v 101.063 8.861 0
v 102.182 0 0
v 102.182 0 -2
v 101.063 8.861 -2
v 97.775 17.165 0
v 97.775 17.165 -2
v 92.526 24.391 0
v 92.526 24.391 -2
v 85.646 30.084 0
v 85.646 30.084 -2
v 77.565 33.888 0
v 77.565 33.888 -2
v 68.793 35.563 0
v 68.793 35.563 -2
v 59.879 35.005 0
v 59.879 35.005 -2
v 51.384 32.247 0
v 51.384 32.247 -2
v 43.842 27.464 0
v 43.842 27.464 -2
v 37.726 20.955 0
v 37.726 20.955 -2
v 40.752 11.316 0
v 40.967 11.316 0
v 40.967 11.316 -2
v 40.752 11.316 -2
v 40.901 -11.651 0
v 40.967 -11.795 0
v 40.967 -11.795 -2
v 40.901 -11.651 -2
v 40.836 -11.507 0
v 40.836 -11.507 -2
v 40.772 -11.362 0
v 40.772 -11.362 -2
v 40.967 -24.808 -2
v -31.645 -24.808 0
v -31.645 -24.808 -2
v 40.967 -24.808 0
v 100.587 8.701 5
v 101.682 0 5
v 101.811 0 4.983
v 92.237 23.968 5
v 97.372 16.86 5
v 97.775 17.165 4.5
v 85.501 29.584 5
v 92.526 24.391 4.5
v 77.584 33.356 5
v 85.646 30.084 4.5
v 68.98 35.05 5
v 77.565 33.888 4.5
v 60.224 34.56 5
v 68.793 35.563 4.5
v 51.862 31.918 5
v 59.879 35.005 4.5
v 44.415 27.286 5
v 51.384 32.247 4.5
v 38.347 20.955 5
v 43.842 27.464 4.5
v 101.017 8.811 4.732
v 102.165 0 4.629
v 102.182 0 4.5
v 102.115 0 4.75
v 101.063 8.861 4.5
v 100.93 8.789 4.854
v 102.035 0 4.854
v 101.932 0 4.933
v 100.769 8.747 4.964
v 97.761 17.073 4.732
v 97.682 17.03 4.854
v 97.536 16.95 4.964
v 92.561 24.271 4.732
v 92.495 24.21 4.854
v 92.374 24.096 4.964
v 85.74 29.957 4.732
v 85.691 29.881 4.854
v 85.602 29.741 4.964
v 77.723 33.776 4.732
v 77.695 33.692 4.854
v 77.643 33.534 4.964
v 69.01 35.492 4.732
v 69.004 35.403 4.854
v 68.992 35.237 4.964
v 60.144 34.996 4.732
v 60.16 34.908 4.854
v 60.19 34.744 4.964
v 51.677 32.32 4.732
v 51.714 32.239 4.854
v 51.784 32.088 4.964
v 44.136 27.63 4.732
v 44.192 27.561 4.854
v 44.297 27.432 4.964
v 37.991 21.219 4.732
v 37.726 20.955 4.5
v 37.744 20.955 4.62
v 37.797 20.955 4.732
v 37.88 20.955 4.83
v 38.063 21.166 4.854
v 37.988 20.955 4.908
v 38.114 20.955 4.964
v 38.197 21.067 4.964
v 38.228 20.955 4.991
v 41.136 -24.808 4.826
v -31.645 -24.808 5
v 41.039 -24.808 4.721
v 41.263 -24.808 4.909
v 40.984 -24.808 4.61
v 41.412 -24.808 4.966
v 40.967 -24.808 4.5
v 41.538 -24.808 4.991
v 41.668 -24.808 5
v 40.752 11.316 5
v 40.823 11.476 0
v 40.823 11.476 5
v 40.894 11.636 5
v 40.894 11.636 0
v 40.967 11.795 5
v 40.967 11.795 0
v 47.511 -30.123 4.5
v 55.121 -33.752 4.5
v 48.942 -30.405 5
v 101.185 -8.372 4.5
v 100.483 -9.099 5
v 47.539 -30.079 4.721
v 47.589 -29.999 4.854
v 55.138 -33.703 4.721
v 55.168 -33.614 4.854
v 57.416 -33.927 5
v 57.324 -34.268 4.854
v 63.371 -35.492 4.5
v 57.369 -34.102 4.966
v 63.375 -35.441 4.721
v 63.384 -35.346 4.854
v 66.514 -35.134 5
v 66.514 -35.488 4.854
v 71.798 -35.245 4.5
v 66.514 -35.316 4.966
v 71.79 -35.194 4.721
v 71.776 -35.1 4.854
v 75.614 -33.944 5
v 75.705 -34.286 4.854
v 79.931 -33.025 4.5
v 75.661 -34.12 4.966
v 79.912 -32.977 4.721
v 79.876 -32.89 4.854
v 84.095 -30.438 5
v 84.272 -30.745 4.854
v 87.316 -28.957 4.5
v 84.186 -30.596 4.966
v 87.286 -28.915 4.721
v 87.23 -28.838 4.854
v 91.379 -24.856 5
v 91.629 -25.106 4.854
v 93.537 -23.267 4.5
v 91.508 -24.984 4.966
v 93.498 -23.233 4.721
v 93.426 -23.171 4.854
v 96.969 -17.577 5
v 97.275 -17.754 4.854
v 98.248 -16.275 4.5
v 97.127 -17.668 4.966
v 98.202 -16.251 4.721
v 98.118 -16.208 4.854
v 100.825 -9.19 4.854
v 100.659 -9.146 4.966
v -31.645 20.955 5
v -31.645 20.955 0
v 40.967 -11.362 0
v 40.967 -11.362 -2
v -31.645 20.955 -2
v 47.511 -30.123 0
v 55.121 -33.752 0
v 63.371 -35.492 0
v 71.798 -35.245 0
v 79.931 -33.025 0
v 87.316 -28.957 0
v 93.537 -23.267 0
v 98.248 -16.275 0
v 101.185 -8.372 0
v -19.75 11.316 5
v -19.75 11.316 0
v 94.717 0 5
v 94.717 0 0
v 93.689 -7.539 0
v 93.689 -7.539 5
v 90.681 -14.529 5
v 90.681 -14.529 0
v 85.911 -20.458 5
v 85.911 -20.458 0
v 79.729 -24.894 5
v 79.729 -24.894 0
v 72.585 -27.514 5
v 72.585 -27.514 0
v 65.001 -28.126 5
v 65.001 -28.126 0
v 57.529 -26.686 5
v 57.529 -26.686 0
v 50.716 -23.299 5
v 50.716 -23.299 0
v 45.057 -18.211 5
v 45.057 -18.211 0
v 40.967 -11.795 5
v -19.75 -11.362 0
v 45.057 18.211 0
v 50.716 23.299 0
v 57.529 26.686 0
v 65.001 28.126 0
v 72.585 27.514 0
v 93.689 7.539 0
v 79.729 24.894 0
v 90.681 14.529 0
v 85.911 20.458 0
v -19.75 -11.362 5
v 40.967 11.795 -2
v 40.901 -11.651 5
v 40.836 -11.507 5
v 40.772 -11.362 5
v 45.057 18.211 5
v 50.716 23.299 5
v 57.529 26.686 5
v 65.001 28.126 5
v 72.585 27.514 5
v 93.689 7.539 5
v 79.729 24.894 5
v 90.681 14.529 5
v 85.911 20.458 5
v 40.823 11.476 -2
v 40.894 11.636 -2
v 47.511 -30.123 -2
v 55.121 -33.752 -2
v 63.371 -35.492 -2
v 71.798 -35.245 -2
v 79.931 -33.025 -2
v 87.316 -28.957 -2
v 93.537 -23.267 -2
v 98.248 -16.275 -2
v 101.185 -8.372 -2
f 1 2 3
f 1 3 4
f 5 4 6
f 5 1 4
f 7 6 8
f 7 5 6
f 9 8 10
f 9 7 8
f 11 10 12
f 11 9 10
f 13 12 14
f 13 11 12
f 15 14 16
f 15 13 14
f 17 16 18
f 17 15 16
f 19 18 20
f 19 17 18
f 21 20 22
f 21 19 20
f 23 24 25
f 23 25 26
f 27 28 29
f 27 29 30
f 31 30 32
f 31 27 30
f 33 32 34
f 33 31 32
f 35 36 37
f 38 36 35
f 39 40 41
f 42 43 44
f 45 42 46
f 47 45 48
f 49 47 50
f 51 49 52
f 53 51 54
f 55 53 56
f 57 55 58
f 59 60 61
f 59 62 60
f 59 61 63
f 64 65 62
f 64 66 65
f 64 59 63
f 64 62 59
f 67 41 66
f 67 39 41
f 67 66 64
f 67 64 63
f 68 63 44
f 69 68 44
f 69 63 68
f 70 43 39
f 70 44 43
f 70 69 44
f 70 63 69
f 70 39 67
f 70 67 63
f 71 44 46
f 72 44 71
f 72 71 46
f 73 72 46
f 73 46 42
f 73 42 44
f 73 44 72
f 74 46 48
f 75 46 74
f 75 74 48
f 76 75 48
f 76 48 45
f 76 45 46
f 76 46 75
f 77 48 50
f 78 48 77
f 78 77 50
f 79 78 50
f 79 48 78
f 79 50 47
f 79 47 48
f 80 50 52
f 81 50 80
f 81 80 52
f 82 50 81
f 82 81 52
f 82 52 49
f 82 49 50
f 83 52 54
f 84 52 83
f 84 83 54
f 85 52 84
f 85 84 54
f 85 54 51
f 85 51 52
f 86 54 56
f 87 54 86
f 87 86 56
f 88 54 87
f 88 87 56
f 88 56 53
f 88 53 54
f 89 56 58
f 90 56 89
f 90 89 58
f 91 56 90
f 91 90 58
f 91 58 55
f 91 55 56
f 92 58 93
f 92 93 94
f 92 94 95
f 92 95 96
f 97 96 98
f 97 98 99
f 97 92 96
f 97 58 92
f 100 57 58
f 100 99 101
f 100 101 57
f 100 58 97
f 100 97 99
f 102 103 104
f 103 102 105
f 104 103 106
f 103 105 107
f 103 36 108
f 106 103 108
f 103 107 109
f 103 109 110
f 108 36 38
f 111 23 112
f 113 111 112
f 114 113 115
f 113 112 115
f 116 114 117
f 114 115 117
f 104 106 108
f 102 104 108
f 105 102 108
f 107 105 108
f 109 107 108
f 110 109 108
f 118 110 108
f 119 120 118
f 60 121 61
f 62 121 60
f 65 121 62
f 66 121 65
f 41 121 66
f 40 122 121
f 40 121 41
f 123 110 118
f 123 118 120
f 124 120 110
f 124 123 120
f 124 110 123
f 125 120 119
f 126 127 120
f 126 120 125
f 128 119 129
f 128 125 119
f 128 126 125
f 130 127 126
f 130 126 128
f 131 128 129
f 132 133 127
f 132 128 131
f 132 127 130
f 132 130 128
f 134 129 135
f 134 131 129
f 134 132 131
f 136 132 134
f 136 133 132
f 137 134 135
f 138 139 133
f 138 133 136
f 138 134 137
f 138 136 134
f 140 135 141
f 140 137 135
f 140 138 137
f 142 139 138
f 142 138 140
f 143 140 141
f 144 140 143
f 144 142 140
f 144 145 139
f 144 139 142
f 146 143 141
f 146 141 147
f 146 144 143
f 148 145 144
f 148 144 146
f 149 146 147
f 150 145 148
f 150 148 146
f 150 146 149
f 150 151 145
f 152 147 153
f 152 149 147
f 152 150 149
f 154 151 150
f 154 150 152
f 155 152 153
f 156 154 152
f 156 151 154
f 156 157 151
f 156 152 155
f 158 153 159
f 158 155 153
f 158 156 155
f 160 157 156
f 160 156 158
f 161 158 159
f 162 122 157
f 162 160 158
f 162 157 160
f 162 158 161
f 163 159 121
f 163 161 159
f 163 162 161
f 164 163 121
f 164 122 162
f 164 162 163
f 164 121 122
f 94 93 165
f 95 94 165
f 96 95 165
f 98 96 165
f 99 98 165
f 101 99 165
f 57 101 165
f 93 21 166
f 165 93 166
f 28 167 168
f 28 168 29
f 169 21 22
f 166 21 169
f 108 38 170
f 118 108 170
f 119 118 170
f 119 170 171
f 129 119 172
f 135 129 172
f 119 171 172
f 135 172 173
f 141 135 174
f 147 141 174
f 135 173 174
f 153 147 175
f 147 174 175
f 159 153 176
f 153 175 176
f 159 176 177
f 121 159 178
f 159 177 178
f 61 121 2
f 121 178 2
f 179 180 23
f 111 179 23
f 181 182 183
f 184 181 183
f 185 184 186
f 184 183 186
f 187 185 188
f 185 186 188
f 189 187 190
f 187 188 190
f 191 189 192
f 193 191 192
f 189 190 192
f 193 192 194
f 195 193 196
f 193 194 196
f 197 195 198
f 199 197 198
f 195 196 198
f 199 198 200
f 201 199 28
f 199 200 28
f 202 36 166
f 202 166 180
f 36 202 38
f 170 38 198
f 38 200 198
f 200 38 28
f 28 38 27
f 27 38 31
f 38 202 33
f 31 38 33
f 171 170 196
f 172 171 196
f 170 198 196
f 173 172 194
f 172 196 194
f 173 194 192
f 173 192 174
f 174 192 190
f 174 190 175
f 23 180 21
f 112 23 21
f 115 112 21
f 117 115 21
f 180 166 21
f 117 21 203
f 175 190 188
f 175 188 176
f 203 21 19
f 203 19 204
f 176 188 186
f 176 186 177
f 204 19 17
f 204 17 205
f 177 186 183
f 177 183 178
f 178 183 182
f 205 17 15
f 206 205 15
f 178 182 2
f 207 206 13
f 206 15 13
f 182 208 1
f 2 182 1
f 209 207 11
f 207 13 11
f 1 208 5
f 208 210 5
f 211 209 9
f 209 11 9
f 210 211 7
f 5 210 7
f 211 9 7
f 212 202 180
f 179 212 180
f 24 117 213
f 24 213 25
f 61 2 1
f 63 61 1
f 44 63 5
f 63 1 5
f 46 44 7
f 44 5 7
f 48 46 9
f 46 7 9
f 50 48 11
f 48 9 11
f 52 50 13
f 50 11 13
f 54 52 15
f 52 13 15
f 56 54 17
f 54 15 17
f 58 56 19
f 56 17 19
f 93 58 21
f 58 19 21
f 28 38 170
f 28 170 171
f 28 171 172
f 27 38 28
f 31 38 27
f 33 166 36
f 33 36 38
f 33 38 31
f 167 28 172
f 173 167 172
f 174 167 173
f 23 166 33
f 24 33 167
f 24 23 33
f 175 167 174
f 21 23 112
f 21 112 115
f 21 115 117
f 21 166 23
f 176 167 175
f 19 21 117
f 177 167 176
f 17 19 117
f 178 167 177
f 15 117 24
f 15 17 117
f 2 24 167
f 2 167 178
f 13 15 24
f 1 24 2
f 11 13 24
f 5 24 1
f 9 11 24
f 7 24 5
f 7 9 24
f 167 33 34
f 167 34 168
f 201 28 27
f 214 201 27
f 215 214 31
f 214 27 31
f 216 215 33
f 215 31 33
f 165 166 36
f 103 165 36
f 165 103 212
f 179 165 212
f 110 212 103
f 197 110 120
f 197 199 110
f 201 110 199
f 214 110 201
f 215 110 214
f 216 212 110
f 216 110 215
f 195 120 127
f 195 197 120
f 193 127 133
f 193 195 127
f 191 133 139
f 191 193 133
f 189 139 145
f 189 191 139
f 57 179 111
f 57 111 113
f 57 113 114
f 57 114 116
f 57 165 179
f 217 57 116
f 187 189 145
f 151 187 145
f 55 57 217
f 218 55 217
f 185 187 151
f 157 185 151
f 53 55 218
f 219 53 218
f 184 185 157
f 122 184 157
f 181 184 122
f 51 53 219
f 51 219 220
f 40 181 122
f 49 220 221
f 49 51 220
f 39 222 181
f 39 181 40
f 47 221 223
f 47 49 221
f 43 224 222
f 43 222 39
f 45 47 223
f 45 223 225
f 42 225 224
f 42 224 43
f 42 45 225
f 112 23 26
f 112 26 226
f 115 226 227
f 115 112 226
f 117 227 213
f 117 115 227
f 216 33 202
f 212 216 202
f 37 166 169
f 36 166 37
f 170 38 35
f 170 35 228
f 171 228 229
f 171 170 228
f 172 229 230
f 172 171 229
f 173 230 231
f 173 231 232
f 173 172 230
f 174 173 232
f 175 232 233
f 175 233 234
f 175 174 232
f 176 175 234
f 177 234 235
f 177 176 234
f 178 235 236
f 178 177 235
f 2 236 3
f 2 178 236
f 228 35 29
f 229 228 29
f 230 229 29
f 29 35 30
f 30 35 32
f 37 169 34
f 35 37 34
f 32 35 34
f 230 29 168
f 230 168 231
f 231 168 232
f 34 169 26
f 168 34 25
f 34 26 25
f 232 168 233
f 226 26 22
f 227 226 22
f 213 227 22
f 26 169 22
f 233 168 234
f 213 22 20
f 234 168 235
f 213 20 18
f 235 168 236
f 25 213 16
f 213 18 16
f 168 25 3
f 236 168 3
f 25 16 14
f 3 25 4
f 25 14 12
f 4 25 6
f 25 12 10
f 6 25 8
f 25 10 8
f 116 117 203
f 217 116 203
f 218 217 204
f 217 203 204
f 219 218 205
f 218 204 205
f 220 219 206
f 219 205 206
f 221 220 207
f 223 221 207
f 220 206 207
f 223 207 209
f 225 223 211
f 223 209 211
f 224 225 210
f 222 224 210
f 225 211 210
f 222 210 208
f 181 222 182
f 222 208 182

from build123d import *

# Parameters (mm, degrees)
F1_DEPTH = 5
F2_DEPTH = 2
F3_R     = 0.5


with BuildPart() as f1:
    # F0 (on Top) → F1 (new body)
    with BuildSketch(Plane.XY):
        with BuildLine():
            Line((40.9670270449, -11.7946057751), (40.9670270449, -24.8077154982))
            ThreePointArc((40.9670270449, -24.8077154982), (79.9314364383, -33.0253063754), (102.1819002091, 0))
            ThreePointArc((102.1819002091, 0), (77.5651040623, 33.8882275669), (37.7262560363, 20.9551379085))
            Line((37.7262560363, 20.9551379085), (40.9670270449, 20.9551379085))
            Line((40.9670270449, 20.9551379085), (40.9670270449, 11.7946057751))
            ThreePointArc((40.9670270449, 11.7946057751), (72.5853396238, 27.5142114088), (94.7165813911, 0))
            ThreePointArc((94.7165813911, 0), (72.5853396238, -27.5142114088), (40.9670270449, -11.7946057751))
        make_face()
        with BuildLine():
            ThreePointArc((32.7735476611, -11.3622117788), (36.1183690598, -18.5431708699), (40.9670270449, -24.8077154982))
            Line((40.9670270449, -24.8077154982), (40.9670270449, -11.7946057751))
            ThreePointArc((40.9670270449, -11.7946057751), (40.868632708, -11.578819153), (40.7720586057, -11.3622117788))
            Line((40.7720586057, -11.3622117788), (32.7735476611, -11.3622117788))
        make_face()
        with BuildLine():
            Line((-31.6453352571, -24.8077154982), (40.9670270449, -24.8077154982))
            ThreePointArc((40.9670270449, -24.8077154982), (36.1183690598, -18.5431708699), (32.7735476611, -11.3622117788))
            Line((32.7735476611, -11.3622117788), (-19.7501089424, -11.3622117788))
            Line((-19.7501089424, -11.3622117788), (-19.7501089424, 11.3164428622))
            Line((-19.7501089424, 11.3164428622), (32.7581847179, 11.3164428622))
            ThreePointArc((32.7581847179, 11.3164428622), (34.8734336467, 16.3258740812), (37.7262560363, 20.9551379085))
            Line((37.7262560363, 20.9551379085), (-31.6453352571, 20.9551379085))
            Line((-31.6453352571, 20.9551379085), (-31.6453352571, -24.8077154982))
        make_face()
        with BuildLine():
            Line((40.9670270449, 20.9551379085), (37.7262560363, 20.9551379085))
            ThreePointArc((37.7262560363, 20.9551379085), (34.8734336467, 16.3258740812), (32.7581847179, 11.3164428622))
            Line((32.7581847179, 11.3164428622), (40.7519316287, 11.3164428622))
            ThreePointArc((40.7519316287, 11.3164428622), (40.8583667908, 11.5560247831), (40.9670270449, 11.7946057751))
            Line((40.9670270449, 11.7946057751), (40.9670270449, 20.9551379085))
        make_face()
    extrude(amount=F1_DEPTH)

    # F3
    f3_edges = [f1.edges().sort_by_distance(p)[0] for p in [
        (102.092882, 2.517188, 5),
    ]]
    fillet(f3_edges, radius=F3_R)


with BuildPart() as f2:
    # F0 (on Top) → F2 (new body)
    with BuildSketch(Plane.XY):
        with BuildLine():
            Line((40.9670270449, -11.3622117788), (40.9670270449, -11.7946057751))
            ThreePointArc((40.9670270449, -11.7946057751), (72.5853396238, -27.5142114088), (94.7165813911, 0))
            ThreePointArc((94.7165813911, 0), (72.5853396238, 27.5142114088), (40.9670270449, 11.7946057751))
            Line((40.9670270449, 11.7946057751), (40.9670270449, 11.3164428622))
            Line((40.9670270449, 11.3164428622), (40.9670270449, -11.3622117788))
        make_face()
        with BuildLine():
            Line((-19.7501089424, -11.3622117788), (32.7735476611, -11.3622117788))
            ThreePointArc((32.7735476611, -11.3622117788), (30.9135512158, -0.024139251), (32.7581847179, 11.3164428622))
            Line((32.7581847179, 11.3164428622), (-19.7501089424, 11.3164428622))
            Line((-19.7501089424, 11.3164428622), (-19.7501089424, -11.3622117788))
        make_face()
        with BuildLine():
            Line((40.7720586057, -11.3622117788), (40.9670270449, -11.3622117788))
            Line((40.9670270449, -11.3622117788), (40.9670270449, 11.3164428622))
            Line((40.9670270449, 11.3164428622), (40.7519316287, 11.3164428622))
            ThreePointArc((40.7519316287, 11.3164428622), (38.378872951, -0.0249994447), (40.7720586057, -11.3622117788))
        make_face()
        with BuildLine():
            ThreePointArc((32.7735476611, -11.3622117788), (36.1183690598, -18.5431708699), (40.9670270449, -24.8077154982))
            Line((40.9670270449, -24.8077154982), (40.9670270449, -11.7946057751))
            ThreePointArc((40.9670270449, -11.7946057751), (40.868632708, -11.578819153), (40.7720586057, -11.3622117788))
            Line((40.7720586057, -11.3622117788), (32.7735476611, -11.3622117788))
        make_face()
        with BuildLine():
            Line((-31.6453352571, -24.8077154982), (40.9670270449, -24.8077154982))
            ThreePointArc((40.9670270449, -24.8077154982), (36.1183690598, -18.5431708699), (32.7735476611, -11.3622117788))
            Line((32.7735476611, -11.3622117788), (-19.7501089424, -11.3622117788))
            Line((-19.7501089424, -11.3622117788), (-19.7501089424, 11.3164428622))
            Line((-19.7501089424, 11.3164428622), (32.7581847179, 11.3164428622))
            ThreePointArc((32.7581847179, 11.3164428622), (34.8734336467, 16.3258740812), (37.7262560363, 20.9551379085))
            Line((37.7262560363, 20.9551379085), (-31.6453352571, 20.9551379085))
            Line((-31.6453352571, 20.9551379085), (-31.6453352571, -24.8077154982))
        make_face()
        with BuildLine():
            Line((40.9670270449, 20.9551379085), (37.7262560363, 20.9551379085))
            ThreePointArc((37.7262560363, 20.9551379085), (34.8734336467, 16.3258740812), (32.7581847179, 11.3164428622))
            Line((32.7581847179, 11.3164428622), (40.7519316287, 11.3164428622))
            ThreePointArc((40.7519316287, 11.3164428622), (40.8583667908, 11.5560247831), (40.9670270449, 11.7946057751))
            Line((40.9670270449, 11.7946057751), (40.9670270449, 20.9551379085))
        make_face()
        with BuildLine():
            Line((40.9670270449, -11.7946057751), (40.9670270449, -24.8077154982))
            ThreePointArc((40.9670270449, -24.8077154982), (79.9314364383, -33.0253063754), (102.1819002091, 0))
            ThreePointArc((102.1819002091, 0), (77.5651040623, 33.8882275669), (37.7262560363, 20.9551379085))
            Line((37.7262560363, 20.9551379085), (40.9670270449, 20.9551379085))
            Line((40.9670270449, 20.9551379085), (40.9670270449, 11.7946057751))
            ThreePointArc((40.9670270449, 11.7946057751), (72.5853396238, 27.5142114088), (94.7165813911, 0))
            ThreePointArc((94.7165813911, 0), (72.5853396238, -27.5142114088), (40.9670270449, -11.7946057751))
        make_face()
        with BuildLine():
            ThreePointArc((32.7581847179, 11.3164428622), (30.9135512158, -0.024139251), (32.7735476611, -11.3622117788))
            Line((32.7735476611, -11.3622117788), (40.7720586057, -11.3622117788))
            ThreePointArc((40.7720586057, -11.3622117788), (38.378872951, -0.0249994447), (40.7519316287, 11.3164428622))
            Line((40.7519316287, 11.3164428622), (32.7581847179, 11.3164428622))
        make_face()
    extrude(amount=-F2_DEPTH)


solid = Compound([f1.part, f2.part])
